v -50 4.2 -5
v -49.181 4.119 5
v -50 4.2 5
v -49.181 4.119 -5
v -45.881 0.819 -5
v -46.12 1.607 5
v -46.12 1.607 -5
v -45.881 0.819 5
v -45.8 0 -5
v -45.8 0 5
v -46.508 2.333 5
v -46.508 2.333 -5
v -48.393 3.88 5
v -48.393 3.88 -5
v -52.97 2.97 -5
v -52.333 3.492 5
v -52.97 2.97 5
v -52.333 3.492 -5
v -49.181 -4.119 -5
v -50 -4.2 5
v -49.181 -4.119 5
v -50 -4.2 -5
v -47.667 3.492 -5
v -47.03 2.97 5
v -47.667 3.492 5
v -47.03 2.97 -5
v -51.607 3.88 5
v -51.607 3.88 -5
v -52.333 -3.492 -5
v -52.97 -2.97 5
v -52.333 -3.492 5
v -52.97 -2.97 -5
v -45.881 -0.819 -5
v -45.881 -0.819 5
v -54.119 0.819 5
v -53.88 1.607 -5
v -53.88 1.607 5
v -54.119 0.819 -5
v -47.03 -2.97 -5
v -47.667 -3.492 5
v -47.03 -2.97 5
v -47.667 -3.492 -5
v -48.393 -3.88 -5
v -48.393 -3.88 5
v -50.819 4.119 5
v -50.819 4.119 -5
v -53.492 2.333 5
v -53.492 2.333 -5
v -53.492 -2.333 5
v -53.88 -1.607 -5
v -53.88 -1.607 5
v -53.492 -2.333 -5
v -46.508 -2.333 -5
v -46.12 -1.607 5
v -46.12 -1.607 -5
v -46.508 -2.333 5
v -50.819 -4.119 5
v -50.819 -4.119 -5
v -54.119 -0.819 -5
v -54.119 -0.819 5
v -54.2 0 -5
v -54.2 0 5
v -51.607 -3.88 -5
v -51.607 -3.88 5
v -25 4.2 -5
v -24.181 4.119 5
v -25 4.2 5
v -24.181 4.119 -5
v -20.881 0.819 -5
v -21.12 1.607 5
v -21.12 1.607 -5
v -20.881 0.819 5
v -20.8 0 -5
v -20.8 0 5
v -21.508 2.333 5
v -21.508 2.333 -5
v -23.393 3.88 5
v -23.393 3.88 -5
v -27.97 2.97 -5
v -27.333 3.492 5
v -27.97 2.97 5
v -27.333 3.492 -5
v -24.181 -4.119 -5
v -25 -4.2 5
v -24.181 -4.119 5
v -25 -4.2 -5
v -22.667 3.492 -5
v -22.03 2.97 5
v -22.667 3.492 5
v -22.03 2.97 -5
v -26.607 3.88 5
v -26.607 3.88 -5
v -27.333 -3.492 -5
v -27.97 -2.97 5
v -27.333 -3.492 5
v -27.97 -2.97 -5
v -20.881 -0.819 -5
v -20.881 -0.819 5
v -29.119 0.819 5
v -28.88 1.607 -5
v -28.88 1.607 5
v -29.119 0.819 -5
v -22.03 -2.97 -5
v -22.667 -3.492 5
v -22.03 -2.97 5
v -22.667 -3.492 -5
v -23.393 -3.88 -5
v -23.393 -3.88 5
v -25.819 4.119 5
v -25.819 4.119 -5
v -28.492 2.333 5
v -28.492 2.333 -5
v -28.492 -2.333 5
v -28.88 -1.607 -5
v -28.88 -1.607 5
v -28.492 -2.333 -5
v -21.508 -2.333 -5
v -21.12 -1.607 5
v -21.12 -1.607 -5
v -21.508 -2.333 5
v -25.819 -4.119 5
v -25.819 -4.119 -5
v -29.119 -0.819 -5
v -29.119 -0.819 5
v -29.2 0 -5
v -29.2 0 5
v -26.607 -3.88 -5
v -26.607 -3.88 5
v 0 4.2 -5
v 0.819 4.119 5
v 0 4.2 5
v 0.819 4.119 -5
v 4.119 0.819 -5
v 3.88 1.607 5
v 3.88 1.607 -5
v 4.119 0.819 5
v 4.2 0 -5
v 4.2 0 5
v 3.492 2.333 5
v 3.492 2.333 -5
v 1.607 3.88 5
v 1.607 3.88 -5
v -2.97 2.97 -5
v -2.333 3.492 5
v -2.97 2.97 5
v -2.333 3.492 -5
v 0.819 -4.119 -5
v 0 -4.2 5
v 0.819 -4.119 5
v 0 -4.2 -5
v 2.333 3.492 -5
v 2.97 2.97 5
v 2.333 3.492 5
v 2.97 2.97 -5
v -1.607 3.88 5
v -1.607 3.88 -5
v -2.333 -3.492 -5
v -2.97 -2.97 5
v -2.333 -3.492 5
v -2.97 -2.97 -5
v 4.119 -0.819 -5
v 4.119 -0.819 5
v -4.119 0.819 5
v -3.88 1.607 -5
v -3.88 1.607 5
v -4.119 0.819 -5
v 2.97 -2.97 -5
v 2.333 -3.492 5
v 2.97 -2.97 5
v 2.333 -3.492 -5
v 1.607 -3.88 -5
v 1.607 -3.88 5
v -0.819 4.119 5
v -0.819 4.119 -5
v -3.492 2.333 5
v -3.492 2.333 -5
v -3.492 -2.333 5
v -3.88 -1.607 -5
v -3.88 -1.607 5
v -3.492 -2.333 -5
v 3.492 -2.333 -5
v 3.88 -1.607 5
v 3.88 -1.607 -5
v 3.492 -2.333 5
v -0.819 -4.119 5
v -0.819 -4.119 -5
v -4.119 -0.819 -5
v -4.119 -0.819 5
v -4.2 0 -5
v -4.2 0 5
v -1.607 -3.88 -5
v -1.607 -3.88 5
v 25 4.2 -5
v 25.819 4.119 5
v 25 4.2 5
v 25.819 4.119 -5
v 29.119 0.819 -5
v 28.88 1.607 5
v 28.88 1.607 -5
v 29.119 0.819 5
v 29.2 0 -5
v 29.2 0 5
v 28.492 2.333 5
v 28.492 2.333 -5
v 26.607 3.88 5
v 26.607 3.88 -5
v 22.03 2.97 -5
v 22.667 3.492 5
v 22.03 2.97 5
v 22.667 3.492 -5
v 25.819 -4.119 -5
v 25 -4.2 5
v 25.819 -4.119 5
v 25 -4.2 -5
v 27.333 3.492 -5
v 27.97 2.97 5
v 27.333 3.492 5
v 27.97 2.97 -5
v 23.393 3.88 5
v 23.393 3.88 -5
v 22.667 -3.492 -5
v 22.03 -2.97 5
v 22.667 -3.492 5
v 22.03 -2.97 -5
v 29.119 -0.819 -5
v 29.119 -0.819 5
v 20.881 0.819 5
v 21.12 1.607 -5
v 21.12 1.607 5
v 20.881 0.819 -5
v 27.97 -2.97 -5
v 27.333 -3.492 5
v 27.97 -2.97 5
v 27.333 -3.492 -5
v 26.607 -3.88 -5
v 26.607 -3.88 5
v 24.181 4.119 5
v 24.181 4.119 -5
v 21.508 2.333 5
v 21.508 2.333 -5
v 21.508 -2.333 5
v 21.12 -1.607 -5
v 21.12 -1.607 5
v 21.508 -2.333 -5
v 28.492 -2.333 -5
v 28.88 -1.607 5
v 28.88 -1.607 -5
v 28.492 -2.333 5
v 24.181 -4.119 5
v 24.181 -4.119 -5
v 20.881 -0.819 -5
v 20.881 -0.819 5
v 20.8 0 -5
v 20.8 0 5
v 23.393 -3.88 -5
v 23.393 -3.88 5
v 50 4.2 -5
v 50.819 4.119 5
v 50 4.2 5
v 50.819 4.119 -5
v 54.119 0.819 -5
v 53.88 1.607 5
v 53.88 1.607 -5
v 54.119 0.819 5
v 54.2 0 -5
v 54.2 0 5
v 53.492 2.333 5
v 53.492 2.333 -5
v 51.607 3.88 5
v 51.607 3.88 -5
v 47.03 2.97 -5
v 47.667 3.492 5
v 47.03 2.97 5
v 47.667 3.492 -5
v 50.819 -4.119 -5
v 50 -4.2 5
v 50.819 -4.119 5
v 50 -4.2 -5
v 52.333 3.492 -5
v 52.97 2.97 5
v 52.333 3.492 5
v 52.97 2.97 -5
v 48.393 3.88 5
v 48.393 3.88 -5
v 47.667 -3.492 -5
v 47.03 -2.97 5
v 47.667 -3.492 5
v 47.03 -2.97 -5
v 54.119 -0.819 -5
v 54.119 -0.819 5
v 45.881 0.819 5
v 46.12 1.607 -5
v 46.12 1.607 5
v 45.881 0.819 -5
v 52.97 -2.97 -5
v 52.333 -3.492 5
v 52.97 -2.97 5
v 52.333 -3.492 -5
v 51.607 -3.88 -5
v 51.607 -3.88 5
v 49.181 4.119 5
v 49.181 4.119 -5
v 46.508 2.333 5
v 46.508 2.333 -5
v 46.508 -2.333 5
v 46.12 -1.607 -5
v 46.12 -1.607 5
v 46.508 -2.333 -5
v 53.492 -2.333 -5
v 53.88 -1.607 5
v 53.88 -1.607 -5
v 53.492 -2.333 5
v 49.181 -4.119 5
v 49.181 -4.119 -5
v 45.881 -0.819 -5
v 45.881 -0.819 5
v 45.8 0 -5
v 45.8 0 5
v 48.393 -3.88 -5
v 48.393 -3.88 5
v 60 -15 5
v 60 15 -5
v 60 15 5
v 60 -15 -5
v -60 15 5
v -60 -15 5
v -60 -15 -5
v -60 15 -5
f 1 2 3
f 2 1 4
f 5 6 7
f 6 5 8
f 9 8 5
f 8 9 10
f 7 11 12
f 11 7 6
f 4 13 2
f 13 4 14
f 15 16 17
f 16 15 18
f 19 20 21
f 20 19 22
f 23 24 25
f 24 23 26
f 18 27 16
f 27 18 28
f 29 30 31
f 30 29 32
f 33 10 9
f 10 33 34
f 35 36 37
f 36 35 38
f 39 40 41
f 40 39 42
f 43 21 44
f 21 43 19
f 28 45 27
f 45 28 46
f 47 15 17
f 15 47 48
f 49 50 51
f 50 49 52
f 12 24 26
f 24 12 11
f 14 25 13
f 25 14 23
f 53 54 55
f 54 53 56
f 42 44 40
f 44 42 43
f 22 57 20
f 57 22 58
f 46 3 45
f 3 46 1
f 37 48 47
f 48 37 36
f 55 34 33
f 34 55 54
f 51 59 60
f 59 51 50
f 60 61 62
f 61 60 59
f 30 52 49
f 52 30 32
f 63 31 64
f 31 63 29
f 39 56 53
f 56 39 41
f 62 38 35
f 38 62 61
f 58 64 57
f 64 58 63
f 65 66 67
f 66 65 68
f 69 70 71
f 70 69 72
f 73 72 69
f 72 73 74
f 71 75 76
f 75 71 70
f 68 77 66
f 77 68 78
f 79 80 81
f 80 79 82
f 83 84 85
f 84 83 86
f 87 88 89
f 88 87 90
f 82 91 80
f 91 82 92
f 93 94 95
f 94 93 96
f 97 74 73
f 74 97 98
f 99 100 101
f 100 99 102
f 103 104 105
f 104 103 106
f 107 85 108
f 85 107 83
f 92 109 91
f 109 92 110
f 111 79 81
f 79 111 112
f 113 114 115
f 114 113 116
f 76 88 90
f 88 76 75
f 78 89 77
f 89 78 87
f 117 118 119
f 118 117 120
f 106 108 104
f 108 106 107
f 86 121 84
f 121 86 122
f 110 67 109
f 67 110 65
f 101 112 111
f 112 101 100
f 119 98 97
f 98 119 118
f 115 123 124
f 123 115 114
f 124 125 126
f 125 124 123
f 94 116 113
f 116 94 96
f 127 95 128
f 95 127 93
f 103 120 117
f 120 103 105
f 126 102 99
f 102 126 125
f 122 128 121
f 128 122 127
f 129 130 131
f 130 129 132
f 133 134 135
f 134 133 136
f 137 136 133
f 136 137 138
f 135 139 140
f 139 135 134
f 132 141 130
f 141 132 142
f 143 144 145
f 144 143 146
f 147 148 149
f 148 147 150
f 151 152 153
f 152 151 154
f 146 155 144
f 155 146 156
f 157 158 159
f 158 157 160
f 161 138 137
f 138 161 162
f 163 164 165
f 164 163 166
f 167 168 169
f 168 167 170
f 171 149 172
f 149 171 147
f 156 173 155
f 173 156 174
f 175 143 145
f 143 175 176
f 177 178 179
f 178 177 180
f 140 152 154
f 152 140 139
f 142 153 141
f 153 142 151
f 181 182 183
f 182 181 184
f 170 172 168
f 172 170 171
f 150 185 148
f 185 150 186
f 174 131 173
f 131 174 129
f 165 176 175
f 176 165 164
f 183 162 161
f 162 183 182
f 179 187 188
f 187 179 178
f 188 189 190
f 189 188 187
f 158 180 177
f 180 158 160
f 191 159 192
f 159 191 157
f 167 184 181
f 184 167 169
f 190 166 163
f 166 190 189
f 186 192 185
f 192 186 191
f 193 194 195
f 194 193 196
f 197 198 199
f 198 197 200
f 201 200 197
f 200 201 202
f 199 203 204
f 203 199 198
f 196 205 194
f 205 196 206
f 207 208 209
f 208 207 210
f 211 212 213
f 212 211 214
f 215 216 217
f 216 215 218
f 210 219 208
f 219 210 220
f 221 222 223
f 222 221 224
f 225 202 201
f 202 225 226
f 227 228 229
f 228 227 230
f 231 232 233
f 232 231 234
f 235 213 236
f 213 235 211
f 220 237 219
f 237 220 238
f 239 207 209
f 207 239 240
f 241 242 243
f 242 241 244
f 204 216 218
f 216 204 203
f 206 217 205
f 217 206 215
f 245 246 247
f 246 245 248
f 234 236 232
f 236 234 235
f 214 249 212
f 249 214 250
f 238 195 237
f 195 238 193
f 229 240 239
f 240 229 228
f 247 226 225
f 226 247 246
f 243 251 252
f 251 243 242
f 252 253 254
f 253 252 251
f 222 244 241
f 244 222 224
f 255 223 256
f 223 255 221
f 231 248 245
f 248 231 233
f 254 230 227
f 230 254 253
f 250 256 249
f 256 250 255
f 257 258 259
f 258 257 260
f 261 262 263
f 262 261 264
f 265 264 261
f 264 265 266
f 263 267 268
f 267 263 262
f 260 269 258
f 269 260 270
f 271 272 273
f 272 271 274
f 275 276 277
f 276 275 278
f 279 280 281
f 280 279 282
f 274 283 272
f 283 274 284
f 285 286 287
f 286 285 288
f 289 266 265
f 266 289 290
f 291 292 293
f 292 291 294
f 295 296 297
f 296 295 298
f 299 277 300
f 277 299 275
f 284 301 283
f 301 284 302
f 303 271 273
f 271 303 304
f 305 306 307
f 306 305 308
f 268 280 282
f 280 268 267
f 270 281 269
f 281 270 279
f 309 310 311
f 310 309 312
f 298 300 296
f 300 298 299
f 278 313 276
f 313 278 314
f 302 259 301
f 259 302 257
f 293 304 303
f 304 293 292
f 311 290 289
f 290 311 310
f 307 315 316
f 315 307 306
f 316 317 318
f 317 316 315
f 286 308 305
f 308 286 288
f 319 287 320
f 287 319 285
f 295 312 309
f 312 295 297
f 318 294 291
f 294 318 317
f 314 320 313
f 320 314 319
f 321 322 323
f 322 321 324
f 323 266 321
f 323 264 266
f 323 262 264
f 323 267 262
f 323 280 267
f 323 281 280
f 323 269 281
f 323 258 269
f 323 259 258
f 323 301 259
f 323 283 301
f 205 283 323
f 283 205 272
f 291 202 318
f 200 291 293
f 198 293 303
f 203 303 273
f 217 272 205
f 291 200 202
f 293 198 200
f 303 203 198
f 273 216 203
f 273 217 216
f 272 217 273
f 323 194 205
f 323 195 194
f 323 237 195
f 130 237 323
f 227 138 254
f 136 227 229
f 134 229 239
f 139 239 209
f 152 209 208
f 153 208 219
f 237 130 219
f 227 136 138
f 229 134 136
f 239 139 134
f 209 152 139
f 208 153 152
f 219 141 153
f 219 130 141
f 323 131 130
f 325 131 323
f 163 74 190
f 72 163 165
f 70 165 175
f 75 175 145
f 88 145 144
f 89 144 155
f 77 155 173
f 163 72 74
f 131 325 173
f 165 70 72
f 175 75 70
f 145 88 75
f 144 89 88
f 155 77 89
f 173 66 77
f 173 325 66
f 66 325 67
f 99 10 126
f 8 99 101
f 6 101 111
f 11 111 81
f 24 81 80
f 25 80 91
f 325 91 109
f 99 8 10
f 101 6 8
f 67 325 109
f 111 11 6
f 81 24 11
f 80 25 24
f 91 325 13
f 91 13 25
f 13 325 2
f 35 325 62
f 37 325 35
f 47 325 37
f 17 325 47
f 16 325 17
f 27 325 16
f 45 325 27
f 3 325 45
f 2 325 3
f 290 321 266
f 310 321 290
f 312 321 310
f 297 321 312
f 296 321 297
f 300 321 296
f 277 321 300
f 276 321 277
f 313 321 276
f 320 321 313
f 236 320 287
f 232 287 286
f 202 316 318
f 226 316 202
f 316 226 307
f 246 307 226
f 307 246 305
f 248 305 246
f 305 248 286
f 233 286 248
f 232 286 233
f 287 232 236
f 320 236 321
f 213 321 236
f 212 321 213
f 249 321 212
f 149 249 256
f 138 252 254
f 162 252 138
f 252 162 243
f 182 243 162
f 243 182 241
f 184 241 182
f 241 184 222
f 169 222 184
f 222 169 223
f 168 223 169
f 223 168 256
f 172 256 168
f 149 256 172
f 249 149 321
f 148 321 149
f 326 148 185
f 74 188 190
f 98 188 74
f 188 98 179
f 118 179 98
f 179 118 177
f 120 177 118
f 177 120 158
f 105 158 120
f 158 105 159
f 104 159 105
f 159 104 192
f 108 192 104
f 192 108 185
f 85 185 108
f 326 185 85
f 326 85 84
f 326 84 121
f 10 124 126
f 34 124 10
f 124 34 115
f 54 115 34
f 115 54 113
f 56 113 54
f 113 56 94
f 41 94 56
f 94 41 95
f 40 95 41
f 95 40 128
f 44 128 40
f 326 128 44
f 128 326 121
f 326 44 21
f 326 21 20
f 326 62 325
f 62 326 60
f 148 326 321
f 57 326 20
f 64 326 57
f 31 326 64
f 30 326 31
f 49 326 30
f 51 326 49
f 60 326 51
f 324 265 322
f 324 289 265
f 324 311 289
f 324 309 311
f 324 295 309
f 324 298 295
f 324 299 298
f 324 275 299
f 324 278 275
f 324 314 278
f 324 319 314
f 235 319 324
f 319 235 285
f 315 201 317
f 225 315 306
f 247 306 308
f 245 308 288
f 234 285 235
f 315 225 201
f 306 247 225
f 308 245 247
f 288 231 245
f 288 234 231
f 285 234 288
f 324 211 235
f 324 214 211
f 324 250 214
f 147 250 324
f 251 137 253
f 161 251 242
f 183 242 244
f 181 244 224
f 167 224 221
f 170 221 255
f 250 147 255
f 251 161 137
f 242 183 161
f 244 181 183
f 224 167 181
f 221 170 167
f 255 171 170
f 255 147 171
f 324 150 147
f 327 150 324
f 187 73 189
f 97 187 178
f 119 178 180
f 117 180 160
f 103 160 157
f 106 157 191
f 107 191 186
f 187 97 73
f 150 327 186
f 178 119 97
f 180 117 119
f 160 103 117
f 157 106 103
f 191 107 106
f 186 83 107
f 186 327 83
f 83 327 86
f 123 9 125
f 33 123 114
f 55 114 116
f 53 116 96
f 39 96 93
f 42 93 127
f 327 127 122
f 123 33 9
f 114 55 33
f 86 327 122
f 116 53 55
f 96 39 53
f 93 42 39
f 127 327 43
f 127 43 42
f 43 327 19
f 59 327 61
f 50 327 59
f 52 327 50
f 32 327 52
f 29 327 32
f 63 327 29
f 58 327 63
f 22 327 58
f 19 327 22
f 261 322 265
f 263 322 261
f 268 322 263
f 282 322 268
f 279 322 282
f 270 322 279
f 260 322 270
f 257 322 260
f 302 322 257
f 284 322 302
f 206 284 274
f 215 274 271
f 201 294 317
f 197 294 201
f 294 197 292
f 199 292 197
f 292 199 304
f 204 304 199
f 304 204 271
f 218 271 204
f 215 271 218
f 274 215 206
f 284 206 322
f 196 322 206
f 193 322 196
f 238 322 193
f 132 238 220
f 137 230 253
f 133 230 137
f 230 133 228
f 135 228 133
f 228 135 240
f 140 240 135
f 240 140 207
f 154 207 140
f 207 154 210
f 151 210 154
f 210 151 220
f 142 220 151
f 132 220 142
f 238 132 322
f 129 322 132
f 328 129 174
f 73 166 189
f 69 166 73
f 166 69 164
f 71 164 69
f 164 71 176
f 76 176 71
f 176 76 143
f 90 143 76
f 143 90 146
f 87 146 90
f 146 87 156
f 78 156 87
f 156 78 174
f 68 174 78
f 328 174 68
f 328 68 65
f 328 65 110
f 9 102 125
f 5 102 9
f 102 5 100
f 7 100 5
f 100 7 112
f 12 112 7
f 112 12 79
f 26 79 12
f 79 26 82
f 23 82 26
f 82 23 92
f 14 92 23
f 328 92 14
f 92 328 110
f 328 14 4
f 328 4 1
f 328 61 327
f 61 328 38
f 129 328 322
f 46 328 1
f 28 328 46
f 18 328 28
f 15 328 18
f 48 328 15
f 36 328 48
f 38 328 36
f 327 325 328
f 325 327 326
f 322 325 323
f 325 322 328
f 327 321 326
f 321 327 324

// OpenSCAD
$fn = 32;

// ----------------------------------------------------------------------
// Hole bar, 5 x Ø8.4
// row layout, 10 mm edge offset
// ----------------------------------------------------------------------

// --- parameters (mm) ---
bar_w = 30;    // bar width (Y)
bar_t = 10;    // bar thickness (Z)
holes = 5;     // holes per row
hole_d = 8.4;  // hole diameter
edge = 10;     // offset from the bar end to the first hole
pitch = 25;    // pitch between neighbouring holes

// --- derived feature positions (mm) ---
span = (holes - 1) * pitch;   // = 100   distance between the end holes
bar_l = span + 2 * edge;      // = 120   overall bar length
start_x = -bar_l / 2 + edge;  // = -50   X of the first hole
feature_centers = [
  [start_x + 0 * pitch, 0],
  [start_x + 1 * pitch, 0],
  [start_x + 2 * pitch, 0],
  [start_x + 3 * pitch, 0],
  [start_x + 4 * pitch, 0]
];   // hole centres of the first row

// bar with one row of holes, drilled from feature_centers
difference() {
  translate([-bar_l / 2, -bar_w / 2, -bar_t / 2]) cube([bar_l, bar_w, bar_t]);
  for (centre = feature_centers)
    translate([centre[0], centre[1], 0])
      cylinder(d = hole_d, h = bar_t + 2, center = true);
}
